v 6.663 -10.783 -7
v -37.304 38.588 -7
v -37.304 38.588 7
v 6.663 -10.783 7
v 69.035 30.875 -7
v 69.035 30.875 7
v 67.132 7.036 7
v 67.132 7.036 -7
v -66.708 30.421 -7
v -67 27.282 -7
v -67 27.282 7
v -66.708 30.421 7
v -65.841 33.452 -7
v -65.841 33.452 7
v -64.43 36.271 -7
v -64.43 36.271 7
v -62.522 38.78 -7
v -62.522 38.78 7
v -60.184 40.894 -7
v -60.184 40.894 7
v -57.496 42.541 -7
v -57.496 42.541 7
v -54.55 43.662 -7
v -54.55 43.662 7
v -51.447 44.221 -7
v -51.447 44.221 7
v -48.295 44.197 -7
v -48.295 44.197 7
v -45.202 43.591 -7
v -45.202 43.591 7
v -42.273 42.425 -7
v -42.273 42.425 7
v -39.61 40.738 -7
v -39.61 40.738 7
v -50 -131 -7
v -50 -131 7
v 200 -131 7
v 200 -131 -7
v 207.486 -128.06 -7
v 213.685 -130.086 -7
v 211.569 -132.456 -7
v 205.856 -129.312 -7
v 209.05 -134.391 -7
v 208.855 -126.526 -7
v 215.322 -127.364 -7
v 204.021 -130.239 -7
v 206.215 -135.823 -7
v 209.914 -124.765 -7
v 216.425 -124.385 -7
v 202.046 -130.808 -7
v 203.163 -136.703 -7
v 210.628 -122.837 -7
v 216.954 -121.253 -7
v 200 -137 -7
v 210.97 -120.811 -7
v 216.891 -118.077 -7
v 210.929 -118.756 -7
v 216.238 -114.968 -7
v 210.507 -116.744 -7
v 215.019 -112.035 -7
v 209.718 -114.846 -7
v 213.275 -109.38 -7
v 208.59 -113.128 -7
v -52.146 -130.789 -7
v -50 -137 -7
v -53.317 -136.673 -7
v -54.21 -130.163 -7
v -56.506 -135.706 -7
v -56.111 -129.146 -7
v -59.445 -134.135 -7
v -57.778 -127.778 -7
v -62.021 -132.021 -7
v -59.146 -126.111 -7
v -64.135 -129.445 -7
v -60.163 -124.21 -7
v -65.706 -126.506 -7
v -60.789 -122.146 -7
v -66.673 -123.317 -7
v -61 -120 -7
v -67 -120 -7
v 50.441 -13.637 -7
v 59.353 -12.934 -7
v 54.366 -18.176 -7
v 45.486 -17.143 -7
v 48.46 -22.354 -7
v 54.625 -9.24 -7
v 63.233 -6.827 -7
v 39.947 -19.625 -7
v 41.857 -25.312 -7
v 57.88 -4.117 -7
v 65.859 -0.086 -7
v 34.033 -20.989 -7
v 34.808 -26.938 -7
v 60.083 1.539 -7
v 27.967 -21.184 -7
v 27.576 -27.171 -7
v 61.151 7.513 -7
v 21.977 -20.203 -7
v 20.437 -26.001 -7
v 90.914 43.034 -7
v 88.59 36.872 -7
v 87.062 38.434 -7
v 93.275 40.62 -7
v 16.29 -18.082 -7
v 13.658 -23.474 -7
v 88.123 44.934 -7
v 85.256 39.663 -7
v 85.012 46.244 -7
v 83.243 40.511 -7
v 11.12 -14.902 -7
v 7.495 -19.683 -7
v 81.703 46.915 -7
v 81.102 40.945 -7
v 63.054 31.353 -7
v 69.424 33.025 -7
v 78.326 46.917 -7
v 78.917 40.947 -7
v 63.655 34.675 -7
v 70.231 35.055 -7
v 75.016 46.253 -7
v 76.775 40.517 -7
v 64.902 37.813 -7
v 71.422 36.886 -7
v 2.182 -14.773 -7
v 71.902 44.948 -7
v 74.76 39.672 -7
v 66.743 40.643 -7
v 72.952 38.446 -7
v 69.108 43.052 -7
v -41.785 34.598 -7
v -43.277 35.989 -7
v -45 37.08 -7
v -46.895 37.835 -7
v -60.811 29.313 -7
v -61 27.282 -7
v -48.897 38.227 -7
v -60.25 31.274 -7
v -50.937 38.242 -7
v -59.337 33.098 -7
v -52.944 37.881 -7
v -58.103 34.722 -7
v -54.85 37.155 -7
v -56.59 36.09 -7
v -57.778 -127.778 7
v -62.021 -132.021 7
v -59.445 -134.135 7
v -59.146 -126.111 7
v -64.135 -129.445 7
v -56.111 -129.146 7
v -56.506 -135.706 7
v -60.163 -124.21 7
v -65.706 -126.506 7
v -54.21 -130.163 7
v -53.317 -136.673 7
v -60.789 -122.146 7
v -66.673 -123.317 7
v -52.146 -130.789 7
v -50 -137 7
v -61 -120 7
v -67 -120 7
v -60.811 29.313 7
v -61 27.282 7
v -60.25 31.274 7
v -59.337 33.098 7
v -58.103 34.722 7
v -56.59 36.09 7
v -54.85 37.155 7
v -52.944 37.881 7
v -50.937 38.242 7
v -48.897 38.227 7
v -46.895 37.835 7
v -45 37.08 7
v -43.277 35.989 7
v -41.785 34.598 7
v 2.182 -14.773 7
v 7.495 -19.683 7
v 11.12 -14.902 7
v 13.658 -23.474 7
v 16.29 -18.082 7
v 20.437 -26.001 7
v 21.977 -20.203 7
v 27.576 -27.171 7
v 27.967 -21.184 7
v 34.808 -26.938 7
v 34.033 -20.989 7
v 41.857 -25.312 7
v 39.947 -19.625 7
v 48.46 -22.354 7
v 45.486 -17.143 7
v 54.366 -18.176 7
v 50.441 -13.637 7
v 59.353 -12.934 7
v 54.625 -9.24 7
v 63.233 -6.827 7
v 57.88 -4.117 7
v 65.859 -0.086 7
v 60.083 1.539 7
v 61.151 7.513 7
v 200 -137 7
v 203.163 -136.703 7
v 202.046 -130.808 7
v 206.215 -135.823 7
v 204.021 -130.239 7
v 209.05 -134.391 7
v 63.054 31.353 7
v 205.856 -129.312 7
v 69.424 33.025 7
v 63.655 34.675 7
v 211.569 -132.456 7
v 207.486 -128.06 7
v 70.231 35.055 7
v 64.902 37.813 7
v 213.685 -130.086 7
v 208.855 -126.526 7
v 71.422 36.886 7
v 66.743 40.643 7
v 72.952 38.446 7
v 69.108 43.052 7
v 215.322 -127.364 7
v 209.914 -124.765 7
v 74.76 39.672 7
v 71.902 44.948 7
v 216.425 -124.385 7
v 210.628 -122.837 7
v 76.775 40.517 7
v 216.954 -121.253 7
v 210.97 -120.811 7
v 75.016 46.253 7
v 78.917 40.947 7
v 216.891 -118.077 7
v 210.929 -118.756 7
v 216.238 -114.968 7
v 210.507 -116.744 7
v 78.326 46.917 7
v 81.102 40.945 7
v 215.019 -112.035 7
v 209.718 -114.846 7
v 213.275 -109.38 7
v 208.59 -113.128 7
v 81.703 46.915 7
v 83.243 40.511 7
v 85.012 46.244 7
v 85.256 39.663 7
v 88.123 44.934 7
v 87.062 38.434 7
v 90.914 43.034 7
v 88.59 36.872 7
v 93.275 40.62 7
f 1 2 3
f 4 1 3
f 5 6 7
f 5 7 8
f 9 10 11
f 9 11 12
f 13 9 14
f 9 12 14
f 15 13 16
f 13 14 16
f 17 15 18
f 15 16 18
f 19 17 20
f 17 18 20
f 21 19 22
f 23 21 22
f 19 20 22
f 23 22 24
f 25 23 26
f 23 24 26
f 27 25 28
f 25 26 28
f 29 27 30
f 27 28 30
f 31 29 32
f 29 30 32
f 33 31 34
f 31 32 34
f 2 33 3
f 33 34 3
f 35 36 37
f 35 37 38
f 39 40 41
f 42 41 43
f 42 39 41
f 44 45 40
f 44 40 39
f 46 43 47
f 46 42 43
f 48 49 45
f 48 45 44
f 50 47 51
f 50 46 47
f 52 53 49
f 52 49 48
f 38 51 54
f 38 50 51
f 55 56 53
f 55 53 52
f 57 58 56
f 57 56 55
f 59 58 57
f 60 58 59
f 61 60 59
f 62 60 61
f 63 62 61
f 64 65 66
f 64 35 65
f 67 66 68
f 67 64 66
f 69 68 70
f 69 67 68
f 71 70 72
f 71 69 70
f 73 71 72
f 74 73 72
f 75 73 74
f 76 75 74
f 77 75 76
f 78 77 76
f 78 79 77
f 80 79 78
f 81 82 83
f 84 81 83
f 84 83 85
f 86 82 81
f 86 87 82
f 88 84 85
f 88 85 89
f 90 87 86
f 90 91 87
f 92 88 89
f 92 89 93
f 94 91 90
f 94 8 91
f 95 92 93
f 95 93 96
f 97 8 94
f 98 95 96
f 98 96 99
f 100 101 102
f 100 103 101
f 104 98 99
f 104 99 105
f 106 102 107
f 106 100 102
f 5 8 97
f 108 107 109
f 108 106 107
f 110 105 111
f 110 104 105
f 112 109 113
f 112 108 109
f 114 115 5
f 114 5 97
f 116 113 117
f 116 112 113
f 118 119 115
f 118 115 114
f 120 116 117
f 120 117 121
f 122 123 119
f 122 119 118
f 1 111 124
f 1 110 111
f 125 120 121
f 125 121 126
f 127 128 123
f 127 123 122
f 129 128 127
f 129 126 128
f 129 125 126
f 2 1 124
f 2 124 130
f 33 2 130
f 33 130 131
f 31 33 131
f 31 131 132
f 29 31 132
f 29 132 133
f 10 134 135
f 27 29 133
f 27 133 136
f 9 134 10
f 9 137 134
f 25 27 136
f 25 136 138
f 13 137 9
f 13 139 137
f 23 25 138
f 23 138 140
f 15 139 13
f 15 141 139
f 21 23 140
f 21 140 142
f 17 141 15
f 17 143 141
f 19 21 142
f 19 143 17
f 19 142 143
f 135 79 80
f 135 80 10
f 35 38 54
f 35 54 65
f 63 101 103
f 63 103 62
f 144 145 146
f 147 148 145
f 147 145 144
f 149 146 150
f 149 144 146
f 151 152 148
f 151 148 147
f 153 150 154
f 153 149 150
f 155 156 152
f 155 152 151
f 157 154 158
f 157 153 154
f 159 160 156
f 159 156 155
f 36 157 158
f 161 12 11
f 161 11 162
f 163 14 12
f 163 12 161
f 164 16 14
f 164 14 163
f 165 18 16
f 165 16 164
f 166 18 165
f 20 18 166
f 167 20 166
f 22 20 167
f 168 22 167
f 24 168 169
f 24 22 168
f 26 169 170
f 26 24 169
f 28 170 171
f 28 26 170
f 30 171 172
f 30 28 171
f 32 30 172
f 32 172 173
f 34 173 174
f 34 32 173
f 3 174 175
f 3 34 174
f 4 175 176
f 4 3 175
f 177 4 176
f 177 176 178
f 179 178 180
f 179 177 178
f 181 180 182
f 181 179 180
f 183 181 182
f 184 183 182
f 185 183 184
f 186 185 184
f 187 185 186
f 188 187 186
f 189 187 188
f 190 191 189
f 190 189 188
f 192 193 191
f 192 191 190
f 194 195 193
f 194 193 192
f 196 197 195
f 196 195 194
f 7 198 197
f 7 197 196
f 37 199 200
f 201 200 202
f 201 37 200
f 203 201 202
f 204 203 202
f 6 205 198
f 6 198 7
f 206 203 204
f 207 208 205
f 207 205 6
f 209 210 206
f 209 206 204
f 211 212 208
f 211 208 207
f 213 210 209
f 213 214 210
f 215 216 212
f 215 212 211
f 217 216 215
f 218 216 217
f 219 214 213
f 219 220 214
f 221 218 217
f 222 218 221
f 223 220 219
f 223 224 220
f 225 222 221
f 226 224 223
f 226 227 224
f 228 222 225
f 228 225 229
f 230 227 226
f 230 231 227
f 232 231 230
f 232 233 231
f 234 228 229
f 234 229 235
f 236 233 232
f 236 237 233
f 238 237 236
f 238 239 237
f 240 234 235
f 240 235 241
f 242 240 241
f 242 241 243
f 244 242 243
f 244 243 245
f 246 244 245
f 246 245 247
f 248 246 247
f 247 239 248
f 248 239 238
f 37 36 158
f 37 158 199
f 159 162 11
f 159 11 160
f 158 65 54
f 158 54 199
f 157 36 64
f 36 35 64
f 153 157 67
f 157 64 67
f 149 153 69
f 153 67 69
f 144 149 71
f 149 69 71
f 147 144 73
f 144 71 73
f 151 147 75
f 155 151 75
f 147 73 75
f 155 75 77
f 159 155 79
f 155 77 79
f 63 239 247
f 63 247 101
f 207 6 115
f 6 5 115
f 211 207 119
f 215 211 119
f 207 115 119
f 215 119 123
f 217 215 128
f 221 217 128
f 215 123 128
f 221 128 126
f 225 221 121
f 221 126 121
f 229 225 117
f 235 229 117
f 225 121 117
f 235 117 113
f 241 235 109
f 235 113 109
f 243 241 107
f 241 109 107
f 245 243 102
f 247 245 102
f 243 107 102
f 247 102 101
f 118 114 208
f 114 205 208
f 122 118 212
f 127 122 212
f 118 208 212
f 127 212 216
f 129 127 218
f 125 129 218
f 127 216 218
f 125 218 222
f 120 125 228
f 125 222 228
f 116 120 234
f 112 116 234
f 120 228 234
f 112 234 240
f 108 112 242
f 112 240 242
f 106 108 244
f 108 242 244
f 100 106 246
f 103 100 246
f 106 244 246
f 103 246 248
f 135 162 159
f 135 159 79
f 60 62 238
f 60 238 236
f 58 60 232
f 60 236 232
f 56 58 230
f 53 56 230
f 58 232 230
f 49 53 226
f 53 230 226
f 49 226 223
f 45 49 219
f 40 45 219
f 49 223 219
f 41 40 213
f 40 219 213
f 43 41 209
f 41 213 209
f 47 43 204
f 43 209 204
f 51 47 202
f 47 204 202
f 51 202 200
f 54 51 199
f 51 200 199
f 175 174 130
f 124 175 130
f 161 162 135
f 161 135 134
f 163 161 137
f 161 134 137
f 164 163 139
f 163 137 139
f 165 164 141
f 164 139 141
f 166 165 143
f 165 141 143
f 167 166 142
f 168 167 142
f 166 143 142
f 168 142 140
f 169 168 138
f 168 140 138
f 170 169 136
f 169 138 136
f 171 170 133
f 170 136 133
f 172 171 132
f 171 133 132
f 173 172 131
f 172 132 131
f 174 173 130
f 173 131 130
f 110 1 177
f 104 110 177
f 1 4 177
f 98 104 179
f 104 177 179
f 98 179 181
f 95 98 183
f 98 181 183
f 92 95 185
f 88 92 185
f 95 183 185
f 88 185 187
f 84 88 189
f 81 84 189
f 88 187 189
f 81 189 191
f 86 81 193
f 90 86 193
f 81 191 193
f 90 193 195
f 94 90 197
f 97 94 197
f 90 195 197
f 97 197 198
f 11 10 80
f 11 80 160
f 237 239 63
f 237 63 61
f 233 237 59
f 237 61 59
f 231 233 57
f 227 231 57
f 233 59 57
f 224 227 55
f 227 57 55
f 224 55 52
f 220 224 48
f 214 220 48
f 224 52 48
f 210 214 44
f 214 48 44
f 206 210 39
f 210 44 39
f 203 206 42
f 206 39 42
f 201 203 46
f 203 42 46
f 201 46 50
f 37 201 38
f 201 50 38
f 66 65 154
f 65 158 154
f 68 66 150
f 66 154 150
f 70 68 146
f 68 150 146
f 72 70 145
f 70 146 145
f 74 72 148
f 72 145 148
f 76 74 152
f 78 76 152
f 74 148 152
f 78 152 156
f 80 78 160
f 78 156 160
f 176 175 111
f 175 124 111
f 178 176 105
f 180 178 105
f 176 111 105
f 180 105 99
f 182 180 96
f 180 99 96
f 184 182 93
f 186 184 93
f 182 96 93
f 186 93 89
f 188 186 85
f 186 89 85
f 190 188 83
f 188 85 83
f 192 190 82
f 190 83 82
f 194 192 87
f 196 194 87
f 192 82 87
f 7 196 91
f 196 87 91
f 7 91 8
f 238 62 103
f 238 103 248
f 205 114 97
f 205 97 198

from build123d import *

# Parameters (mm, degrees)
SKETCH3_W = 14
SKETCH3_H = 6


with BuildPart() as part:
    # Sweep1: sweep along a path in Sketch2
    with BuildLine(Plane.XY) as sweep1_path:
        Line((64.14139557, 7.274636075), (66.044393052, 31.114017371))
        ThreePointArc((66.044393052, 31.114017371), (75.895604213, 43.384839753), (90.932163332, 38.745730666))
        Line((90.932163332, 38.745730666), (210.932163332, -111.254269334))
        ThreePointArc((210.932163332, -111.254269334), (212.618245308, -126.064642227), (200, -134))
        Line((200, -134), (-50, -134))
        ThreePointArc((-50, -134), (-59.899494937, -129.899494937), (-64, -120))
        Line((-64, -120), (-64, 27.282396409))
        ThreePointArc((-64, 27.282396409), (-54.981361234, 40.366204733), (-39.544851392, 36.593135778))
        Line((-39.544851392, 36.593135778), (4.422225727, -12.778058812))
        ThreePointArc((4.422225727, -12.778058812), (40.902364216, -22.46846092), (64.14139557, 7.274636075))
    # Sketch3 → Sweep1 (sweep)
    with BuildSketch(Plane(origin=(-50, -134, 0), x_dir=(0, 0, 1), z_dir=(-1, 0, 0))):
        Rectangle(SKETCH3_W, SKETCH3_H)
    sweep(path=sweep1_path.line)


solid = part.part
